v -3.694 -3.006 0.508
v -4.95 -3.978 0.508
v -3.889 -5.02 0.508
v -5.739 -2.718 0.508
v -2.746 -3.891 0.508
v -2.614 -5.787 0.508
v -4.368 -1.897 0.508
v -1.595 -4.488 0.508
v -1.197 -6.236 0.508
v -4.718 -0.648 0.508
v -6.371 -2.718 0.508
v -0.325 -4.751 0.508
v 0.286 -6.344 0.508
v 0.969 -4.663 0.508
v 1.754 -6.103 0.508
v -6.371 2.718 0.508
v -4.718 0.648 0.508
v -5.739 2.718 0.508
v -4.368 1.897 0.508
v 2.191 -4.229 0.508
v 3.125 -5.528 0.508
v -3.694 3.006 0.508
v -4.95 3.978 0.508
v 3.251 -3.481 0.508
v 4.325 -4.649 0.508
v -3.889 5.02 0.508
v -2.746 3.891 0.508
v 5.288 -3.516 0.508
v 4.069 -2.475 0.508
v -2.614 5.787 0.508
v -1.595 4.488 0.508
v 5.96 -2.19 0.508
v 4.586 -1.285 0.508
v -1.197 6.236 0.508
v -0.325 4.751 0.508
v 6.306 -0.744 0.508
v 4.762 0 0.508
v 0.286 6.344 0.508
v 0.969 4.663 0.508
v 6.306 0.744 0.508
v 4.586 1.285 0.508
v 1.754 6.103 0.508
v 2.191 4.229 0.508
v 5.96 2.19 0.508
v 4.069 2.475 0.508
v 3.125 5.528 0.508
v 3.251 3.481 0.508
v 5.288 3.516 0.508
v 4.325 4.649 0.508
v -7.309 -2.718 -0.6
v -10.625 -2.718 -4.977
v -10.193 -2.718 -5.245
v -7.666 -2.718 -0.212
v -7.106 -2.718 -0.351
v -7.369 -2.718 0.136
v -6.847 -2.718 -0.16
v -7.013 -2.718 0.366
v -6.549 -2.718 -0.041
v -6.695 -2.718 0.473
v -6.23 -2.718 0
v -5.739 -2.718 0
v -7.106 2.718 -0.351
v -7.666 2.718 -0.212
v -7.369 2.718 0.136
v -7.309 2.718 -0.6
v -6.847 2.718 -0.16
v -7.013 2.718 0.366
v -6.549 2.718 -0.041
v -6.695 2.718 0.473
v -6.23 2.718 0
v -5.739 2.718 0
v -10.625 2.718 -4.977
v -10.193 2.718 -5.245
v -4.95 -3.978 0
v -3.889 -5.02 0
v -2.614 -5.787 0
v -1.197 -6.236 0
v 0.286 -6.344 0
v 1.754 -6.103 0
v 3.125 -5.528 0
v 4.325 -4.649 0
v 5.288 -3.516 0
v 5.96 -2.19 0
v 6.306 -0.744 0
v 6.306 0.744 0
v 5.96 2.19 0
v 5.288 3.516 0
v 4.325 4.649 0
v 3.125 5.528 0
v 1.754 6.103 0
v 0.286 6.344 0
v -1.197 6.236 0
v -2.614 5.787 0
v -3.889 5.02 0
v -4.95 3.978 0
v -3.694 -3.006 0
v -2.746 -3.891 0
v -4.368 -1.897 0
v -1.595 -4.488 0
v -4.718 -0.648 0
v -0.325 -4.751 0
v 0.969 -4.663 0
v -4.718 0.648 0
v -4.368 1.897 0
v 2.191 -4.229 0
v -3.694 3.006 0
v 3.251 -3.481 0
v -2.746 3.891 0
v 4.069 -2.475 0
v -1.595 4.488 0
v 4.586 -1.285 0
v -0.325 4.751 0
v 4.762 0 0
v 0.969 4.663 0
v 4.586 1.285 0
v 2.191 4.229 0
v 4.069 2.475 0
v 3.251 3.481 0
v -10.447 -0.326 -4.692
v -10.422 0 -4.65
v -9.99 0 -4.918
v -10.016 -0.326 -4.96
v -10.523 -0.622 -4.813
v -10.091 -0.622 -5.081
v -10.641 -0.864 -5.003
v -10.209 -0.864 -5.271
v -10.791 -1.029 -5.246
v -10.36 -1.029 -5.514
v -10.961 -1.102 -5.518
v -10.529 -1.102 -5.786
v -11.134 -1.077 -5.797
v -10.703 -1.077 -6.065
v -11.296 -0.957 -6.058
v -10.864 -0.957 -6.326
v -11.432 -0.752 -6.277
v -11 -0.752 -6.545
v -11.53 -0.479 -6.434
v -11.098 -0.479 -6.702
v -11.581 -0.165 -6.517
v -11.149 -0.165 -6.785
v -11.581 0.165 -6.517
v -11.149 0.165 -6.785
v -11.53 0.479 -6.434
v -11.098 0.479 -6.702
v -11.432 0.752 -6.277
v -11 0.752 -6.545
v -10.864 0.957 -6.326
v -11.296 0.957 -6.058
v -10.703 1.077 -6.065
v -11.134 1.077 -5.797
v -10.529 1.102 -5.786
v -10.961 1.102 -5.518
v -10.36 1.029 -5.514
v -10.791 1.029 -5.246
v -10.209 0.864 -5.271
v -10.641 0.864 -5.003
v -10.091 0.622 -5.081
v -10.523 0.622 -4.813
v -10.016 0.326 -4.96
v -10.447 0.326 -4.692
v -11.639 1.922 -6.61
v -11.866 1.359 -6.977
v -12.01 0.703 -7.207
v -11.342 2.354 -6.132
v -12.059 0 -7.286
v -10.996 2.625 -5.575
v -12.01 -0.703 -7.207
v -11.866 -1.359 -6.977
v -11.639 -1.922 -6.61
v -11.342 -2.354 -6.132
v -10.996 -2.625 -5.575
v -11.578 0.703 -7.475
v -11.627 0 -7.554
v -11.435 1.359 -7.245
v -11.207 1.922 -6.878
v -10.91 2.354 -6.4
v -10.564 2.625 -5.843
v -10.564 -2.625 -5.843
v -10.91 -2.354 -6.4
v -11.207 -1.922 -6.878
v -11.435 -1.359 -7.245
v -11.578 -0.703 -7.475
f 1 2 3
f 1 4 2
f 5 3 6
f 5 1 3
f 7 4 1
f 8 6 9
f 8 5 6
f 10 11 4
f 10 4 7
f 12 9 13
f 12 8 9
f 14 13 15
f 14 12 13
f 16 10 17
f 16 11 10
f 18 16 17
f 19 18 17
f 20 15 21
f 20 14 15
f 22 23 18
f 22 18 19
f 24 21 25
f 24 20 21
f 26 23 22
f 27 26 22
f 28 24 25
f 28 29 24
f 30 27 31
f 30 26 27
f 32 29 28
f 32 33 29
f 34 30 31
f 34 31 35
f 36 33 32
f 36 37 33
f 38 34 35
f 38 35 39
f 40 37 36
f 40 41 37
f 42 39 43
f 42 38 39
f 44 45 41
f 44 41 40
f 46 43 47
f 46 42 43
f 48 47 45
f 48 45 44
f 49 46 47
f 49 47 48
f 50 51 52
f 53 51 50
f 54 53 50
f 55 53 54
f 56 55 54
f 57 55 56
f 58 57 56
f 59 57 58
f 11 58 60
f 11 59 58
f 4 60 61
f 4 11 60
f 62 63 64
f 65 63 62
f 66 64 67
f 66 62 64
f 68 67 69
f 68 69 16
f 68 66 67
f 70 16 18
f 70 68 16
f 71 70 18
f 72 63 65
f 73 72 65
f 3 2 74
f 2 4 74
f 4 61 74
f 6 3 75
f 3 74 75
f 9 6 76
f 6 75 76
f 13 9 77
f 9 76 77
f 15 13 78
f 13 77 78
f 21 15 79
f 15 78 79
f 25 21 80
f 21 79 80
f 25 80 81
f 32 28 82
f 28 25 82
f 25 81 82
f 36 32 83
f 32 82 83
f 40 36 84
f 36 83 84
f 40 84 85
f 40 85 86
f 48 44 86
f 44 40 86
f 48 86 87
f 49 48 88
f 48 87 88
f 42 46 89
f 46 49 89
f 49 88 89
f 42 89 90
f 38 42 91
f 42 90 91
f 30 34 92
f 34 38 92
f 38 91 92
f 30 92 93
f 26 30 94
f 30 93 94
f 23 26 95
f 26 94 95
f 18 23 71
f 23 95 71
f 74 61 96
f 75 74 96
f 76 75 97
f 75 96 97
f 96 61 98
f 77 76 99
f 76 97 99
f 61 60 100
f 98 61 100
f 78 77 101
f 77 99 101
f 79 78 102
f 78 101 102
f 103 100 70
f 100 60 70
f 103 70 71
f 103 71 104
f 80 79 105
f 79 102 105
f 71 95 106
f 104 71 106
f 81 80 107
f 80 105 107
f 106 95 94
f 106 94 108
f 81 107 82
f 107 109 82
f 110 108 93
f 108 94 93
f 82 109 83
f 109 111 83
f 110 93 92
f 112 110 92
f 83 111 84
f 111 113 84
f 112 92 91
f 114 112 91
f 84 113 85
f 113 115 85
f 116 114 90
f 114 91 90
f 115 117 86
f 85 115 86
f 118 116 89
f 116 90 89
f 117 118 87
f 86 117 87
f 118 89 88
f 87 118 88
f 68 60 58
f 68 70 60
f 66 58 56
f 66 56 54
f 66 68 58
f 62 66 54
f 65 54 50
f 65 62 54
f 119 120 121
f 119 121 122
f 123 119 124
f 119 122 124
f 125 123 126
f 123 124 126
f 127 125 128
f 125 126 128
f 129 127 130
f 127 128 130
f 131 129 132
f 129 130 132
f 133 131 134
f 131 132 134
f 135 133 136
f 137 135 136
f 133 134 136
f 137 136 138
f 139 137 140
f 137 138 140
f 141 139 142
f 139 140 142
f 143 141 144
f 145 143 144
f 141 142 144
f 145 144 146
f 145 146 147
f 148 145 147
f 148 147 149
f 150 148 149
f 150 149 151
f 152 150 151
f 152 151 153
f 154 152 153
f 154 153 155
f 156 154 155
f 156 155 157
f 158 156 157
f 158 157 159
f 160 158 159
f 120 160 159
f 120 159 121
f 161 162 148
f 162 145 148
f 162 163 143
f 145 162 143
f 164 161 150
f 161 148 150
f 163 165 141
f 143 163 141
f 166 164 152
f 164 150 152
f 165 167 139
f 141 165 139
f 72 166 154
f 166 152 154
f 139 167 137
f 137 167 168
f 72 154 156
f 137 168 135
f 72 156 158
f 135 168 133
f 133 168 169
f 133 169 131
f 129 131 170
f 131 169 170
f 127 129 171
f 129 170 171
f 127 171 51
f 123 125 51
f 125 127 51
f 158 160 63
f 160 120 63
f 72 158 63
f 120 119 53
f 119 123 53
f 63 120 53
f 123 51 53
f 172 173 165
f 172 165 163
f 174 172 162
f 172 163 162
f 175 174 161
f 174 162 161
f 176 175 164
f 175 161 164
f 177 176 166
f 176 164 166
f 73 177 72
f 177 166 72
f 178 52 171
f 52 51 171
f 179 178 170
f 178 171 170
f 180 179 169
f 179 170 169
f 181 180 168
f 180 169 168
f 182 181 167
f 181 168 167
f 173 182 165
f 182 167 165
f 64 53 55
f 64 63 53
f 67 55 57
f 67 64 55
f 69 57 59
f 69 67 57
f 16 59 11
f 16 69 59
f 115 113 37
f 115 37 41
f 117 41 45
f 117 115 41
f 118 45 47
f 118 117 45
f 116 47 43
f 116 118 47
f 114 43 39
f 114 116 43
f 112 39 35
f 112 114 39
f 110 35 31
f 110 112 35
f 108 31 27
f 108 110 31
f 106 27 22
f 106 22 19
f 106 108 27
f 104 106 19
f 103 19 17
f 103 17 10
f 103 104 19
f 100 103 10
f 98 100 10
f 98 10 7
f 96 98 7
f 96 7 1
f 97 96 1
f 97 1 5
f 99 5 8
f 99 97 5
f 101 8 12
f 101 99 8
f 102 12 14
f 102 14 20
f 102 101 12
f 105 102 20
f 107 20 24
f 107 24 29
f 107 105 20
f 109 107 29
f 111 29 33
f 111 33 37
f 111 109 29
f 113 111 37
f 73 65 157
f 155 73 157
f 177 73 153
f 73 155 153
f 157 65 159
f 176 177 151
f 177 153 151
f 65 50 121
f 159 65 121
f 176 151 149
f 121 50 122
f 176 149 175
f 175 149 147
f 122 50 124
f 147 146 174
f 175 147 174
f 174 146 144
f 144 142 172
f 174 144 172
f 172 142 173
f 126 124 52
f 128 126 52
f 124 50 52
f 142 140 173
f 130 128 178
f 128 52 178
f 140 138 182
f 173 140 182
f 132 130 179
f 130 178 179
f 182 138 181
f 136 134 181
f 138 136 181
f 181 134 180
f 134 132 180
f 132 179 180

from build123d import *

# Parameters (mm, degrees)
SKETCH1_R                           = 6.35
SKETCH1_R_2                         = 4.7625
EXTRUDE1_DEPTH                      = 0.508
EXTRUDE2_DEPTH                      = 2.7178
EXTRUDE2_DEPTH_BACK                 = 2.7178
SKETCH3_W                           = 0.611005039
SKETCH3_H                           = 5.4356
EXTRUDE3_DEPTH                      = 0.508
FILLET1_R                           = 1.27
FILLET2_R                           = 1.524
FILLET3_R                           = 2.7178
F_1_32_0_03125_DIAMETER_HOLE1_D     = 2.2098
F_1_32_0_03125_DIAMETER_HOLE1_DEPTH = 6.35


with BuildPart() as part:
    # Sketch1 → Extrude1 (new body)
    with BuildSketch(Plane.XY):
        Circle(SKETCH1_R)
        Circle(SKETCH1_R_2, mode=Mode.SUBTRACT)
    extrude(amount=EXTRUDE1_DEPTH)



with BuildPart() as body_2:
    # Sketch2 → Extrude2 (new, two sides: drawn at the far end of the back side and taken through both)
    with BuildSketch(Plane(origin=(0, 0, 0), x_dir=(1, 0, 0), z_dir=(0, 1, 0)).offset(-EXTRUDE2_DEPTH_BACK)):
        Polygon((-6.35, -0.508), (-6.35, 0), (-6.935979418, 0), (-11.626998738, 7.554015397), (-12.058556542, 7.286019385), (-7.367537222, -0.267996011), (-7.218495515, -0.508), (-6.935979418, -0.508), align=None)
    extrude(amount=EXTRUDE2_DEPTH + EXTRUDE2_DEPTH_BACK)


with BuildPart() as part_1:
    add(part.part)

    add(body_2.part)  # Extrude3 merges body 2
    # Sketch3 → Extrude3 (add)
    with BuildSketch(Plane.XY.offset(0.508)):
        with Locations((-6.044497481, 0)):
            Rectangle(SKETCH3_W, SKETCH3_H)
    extrude(amount=-EXTRUDE3_DEPTH)

    # Fillet1
    fillet1_edges = [part_1.edges().sort_by_distance(p)[0] for p in [
        (-6.935979418, 0, 0),
    ]]
    fillet(fillet1_edges, radius=FILLET1_R)

    # Fillet2
    fillet2_edges = [part_1.edges().sort_by_distance(p)[0] for p in [
        (-7.218495515, 0, 0.508),
    ]]
    fillet(fillet2_edges, radius=FILLET2_R)

    # Fillet3
    fillet3_edges = [part_1.edges().sort_by_distance(p)[0] for p in [
        (-11.84277764, 2.7178, -7.420017391),
        (-11.84277764, -2.7178, -7.420017391),
    ]]
    fillet(fillet3_edges, radius=FILLET3_R - 0.0001)  # a hair under: the kernel refuses the full size

    # 1/32 (0.03125) Diameter Hole1
    with Locations(Plane(origin=(-11.00440601, 0, -5.588505732), x_dir=(-0.527551203197, 0, -0.849523235707), z_dir=(-0.849523235707, 0, 0.527551203197))):
        with Locations((0, 0)):
            Hole(F_1_32_0_03125_DIAMETER_HOLE1_D / 2, depth=F_1_32_0_03125_DIAMETER_HOLE1_DEPTH)


solid = part_1.part
